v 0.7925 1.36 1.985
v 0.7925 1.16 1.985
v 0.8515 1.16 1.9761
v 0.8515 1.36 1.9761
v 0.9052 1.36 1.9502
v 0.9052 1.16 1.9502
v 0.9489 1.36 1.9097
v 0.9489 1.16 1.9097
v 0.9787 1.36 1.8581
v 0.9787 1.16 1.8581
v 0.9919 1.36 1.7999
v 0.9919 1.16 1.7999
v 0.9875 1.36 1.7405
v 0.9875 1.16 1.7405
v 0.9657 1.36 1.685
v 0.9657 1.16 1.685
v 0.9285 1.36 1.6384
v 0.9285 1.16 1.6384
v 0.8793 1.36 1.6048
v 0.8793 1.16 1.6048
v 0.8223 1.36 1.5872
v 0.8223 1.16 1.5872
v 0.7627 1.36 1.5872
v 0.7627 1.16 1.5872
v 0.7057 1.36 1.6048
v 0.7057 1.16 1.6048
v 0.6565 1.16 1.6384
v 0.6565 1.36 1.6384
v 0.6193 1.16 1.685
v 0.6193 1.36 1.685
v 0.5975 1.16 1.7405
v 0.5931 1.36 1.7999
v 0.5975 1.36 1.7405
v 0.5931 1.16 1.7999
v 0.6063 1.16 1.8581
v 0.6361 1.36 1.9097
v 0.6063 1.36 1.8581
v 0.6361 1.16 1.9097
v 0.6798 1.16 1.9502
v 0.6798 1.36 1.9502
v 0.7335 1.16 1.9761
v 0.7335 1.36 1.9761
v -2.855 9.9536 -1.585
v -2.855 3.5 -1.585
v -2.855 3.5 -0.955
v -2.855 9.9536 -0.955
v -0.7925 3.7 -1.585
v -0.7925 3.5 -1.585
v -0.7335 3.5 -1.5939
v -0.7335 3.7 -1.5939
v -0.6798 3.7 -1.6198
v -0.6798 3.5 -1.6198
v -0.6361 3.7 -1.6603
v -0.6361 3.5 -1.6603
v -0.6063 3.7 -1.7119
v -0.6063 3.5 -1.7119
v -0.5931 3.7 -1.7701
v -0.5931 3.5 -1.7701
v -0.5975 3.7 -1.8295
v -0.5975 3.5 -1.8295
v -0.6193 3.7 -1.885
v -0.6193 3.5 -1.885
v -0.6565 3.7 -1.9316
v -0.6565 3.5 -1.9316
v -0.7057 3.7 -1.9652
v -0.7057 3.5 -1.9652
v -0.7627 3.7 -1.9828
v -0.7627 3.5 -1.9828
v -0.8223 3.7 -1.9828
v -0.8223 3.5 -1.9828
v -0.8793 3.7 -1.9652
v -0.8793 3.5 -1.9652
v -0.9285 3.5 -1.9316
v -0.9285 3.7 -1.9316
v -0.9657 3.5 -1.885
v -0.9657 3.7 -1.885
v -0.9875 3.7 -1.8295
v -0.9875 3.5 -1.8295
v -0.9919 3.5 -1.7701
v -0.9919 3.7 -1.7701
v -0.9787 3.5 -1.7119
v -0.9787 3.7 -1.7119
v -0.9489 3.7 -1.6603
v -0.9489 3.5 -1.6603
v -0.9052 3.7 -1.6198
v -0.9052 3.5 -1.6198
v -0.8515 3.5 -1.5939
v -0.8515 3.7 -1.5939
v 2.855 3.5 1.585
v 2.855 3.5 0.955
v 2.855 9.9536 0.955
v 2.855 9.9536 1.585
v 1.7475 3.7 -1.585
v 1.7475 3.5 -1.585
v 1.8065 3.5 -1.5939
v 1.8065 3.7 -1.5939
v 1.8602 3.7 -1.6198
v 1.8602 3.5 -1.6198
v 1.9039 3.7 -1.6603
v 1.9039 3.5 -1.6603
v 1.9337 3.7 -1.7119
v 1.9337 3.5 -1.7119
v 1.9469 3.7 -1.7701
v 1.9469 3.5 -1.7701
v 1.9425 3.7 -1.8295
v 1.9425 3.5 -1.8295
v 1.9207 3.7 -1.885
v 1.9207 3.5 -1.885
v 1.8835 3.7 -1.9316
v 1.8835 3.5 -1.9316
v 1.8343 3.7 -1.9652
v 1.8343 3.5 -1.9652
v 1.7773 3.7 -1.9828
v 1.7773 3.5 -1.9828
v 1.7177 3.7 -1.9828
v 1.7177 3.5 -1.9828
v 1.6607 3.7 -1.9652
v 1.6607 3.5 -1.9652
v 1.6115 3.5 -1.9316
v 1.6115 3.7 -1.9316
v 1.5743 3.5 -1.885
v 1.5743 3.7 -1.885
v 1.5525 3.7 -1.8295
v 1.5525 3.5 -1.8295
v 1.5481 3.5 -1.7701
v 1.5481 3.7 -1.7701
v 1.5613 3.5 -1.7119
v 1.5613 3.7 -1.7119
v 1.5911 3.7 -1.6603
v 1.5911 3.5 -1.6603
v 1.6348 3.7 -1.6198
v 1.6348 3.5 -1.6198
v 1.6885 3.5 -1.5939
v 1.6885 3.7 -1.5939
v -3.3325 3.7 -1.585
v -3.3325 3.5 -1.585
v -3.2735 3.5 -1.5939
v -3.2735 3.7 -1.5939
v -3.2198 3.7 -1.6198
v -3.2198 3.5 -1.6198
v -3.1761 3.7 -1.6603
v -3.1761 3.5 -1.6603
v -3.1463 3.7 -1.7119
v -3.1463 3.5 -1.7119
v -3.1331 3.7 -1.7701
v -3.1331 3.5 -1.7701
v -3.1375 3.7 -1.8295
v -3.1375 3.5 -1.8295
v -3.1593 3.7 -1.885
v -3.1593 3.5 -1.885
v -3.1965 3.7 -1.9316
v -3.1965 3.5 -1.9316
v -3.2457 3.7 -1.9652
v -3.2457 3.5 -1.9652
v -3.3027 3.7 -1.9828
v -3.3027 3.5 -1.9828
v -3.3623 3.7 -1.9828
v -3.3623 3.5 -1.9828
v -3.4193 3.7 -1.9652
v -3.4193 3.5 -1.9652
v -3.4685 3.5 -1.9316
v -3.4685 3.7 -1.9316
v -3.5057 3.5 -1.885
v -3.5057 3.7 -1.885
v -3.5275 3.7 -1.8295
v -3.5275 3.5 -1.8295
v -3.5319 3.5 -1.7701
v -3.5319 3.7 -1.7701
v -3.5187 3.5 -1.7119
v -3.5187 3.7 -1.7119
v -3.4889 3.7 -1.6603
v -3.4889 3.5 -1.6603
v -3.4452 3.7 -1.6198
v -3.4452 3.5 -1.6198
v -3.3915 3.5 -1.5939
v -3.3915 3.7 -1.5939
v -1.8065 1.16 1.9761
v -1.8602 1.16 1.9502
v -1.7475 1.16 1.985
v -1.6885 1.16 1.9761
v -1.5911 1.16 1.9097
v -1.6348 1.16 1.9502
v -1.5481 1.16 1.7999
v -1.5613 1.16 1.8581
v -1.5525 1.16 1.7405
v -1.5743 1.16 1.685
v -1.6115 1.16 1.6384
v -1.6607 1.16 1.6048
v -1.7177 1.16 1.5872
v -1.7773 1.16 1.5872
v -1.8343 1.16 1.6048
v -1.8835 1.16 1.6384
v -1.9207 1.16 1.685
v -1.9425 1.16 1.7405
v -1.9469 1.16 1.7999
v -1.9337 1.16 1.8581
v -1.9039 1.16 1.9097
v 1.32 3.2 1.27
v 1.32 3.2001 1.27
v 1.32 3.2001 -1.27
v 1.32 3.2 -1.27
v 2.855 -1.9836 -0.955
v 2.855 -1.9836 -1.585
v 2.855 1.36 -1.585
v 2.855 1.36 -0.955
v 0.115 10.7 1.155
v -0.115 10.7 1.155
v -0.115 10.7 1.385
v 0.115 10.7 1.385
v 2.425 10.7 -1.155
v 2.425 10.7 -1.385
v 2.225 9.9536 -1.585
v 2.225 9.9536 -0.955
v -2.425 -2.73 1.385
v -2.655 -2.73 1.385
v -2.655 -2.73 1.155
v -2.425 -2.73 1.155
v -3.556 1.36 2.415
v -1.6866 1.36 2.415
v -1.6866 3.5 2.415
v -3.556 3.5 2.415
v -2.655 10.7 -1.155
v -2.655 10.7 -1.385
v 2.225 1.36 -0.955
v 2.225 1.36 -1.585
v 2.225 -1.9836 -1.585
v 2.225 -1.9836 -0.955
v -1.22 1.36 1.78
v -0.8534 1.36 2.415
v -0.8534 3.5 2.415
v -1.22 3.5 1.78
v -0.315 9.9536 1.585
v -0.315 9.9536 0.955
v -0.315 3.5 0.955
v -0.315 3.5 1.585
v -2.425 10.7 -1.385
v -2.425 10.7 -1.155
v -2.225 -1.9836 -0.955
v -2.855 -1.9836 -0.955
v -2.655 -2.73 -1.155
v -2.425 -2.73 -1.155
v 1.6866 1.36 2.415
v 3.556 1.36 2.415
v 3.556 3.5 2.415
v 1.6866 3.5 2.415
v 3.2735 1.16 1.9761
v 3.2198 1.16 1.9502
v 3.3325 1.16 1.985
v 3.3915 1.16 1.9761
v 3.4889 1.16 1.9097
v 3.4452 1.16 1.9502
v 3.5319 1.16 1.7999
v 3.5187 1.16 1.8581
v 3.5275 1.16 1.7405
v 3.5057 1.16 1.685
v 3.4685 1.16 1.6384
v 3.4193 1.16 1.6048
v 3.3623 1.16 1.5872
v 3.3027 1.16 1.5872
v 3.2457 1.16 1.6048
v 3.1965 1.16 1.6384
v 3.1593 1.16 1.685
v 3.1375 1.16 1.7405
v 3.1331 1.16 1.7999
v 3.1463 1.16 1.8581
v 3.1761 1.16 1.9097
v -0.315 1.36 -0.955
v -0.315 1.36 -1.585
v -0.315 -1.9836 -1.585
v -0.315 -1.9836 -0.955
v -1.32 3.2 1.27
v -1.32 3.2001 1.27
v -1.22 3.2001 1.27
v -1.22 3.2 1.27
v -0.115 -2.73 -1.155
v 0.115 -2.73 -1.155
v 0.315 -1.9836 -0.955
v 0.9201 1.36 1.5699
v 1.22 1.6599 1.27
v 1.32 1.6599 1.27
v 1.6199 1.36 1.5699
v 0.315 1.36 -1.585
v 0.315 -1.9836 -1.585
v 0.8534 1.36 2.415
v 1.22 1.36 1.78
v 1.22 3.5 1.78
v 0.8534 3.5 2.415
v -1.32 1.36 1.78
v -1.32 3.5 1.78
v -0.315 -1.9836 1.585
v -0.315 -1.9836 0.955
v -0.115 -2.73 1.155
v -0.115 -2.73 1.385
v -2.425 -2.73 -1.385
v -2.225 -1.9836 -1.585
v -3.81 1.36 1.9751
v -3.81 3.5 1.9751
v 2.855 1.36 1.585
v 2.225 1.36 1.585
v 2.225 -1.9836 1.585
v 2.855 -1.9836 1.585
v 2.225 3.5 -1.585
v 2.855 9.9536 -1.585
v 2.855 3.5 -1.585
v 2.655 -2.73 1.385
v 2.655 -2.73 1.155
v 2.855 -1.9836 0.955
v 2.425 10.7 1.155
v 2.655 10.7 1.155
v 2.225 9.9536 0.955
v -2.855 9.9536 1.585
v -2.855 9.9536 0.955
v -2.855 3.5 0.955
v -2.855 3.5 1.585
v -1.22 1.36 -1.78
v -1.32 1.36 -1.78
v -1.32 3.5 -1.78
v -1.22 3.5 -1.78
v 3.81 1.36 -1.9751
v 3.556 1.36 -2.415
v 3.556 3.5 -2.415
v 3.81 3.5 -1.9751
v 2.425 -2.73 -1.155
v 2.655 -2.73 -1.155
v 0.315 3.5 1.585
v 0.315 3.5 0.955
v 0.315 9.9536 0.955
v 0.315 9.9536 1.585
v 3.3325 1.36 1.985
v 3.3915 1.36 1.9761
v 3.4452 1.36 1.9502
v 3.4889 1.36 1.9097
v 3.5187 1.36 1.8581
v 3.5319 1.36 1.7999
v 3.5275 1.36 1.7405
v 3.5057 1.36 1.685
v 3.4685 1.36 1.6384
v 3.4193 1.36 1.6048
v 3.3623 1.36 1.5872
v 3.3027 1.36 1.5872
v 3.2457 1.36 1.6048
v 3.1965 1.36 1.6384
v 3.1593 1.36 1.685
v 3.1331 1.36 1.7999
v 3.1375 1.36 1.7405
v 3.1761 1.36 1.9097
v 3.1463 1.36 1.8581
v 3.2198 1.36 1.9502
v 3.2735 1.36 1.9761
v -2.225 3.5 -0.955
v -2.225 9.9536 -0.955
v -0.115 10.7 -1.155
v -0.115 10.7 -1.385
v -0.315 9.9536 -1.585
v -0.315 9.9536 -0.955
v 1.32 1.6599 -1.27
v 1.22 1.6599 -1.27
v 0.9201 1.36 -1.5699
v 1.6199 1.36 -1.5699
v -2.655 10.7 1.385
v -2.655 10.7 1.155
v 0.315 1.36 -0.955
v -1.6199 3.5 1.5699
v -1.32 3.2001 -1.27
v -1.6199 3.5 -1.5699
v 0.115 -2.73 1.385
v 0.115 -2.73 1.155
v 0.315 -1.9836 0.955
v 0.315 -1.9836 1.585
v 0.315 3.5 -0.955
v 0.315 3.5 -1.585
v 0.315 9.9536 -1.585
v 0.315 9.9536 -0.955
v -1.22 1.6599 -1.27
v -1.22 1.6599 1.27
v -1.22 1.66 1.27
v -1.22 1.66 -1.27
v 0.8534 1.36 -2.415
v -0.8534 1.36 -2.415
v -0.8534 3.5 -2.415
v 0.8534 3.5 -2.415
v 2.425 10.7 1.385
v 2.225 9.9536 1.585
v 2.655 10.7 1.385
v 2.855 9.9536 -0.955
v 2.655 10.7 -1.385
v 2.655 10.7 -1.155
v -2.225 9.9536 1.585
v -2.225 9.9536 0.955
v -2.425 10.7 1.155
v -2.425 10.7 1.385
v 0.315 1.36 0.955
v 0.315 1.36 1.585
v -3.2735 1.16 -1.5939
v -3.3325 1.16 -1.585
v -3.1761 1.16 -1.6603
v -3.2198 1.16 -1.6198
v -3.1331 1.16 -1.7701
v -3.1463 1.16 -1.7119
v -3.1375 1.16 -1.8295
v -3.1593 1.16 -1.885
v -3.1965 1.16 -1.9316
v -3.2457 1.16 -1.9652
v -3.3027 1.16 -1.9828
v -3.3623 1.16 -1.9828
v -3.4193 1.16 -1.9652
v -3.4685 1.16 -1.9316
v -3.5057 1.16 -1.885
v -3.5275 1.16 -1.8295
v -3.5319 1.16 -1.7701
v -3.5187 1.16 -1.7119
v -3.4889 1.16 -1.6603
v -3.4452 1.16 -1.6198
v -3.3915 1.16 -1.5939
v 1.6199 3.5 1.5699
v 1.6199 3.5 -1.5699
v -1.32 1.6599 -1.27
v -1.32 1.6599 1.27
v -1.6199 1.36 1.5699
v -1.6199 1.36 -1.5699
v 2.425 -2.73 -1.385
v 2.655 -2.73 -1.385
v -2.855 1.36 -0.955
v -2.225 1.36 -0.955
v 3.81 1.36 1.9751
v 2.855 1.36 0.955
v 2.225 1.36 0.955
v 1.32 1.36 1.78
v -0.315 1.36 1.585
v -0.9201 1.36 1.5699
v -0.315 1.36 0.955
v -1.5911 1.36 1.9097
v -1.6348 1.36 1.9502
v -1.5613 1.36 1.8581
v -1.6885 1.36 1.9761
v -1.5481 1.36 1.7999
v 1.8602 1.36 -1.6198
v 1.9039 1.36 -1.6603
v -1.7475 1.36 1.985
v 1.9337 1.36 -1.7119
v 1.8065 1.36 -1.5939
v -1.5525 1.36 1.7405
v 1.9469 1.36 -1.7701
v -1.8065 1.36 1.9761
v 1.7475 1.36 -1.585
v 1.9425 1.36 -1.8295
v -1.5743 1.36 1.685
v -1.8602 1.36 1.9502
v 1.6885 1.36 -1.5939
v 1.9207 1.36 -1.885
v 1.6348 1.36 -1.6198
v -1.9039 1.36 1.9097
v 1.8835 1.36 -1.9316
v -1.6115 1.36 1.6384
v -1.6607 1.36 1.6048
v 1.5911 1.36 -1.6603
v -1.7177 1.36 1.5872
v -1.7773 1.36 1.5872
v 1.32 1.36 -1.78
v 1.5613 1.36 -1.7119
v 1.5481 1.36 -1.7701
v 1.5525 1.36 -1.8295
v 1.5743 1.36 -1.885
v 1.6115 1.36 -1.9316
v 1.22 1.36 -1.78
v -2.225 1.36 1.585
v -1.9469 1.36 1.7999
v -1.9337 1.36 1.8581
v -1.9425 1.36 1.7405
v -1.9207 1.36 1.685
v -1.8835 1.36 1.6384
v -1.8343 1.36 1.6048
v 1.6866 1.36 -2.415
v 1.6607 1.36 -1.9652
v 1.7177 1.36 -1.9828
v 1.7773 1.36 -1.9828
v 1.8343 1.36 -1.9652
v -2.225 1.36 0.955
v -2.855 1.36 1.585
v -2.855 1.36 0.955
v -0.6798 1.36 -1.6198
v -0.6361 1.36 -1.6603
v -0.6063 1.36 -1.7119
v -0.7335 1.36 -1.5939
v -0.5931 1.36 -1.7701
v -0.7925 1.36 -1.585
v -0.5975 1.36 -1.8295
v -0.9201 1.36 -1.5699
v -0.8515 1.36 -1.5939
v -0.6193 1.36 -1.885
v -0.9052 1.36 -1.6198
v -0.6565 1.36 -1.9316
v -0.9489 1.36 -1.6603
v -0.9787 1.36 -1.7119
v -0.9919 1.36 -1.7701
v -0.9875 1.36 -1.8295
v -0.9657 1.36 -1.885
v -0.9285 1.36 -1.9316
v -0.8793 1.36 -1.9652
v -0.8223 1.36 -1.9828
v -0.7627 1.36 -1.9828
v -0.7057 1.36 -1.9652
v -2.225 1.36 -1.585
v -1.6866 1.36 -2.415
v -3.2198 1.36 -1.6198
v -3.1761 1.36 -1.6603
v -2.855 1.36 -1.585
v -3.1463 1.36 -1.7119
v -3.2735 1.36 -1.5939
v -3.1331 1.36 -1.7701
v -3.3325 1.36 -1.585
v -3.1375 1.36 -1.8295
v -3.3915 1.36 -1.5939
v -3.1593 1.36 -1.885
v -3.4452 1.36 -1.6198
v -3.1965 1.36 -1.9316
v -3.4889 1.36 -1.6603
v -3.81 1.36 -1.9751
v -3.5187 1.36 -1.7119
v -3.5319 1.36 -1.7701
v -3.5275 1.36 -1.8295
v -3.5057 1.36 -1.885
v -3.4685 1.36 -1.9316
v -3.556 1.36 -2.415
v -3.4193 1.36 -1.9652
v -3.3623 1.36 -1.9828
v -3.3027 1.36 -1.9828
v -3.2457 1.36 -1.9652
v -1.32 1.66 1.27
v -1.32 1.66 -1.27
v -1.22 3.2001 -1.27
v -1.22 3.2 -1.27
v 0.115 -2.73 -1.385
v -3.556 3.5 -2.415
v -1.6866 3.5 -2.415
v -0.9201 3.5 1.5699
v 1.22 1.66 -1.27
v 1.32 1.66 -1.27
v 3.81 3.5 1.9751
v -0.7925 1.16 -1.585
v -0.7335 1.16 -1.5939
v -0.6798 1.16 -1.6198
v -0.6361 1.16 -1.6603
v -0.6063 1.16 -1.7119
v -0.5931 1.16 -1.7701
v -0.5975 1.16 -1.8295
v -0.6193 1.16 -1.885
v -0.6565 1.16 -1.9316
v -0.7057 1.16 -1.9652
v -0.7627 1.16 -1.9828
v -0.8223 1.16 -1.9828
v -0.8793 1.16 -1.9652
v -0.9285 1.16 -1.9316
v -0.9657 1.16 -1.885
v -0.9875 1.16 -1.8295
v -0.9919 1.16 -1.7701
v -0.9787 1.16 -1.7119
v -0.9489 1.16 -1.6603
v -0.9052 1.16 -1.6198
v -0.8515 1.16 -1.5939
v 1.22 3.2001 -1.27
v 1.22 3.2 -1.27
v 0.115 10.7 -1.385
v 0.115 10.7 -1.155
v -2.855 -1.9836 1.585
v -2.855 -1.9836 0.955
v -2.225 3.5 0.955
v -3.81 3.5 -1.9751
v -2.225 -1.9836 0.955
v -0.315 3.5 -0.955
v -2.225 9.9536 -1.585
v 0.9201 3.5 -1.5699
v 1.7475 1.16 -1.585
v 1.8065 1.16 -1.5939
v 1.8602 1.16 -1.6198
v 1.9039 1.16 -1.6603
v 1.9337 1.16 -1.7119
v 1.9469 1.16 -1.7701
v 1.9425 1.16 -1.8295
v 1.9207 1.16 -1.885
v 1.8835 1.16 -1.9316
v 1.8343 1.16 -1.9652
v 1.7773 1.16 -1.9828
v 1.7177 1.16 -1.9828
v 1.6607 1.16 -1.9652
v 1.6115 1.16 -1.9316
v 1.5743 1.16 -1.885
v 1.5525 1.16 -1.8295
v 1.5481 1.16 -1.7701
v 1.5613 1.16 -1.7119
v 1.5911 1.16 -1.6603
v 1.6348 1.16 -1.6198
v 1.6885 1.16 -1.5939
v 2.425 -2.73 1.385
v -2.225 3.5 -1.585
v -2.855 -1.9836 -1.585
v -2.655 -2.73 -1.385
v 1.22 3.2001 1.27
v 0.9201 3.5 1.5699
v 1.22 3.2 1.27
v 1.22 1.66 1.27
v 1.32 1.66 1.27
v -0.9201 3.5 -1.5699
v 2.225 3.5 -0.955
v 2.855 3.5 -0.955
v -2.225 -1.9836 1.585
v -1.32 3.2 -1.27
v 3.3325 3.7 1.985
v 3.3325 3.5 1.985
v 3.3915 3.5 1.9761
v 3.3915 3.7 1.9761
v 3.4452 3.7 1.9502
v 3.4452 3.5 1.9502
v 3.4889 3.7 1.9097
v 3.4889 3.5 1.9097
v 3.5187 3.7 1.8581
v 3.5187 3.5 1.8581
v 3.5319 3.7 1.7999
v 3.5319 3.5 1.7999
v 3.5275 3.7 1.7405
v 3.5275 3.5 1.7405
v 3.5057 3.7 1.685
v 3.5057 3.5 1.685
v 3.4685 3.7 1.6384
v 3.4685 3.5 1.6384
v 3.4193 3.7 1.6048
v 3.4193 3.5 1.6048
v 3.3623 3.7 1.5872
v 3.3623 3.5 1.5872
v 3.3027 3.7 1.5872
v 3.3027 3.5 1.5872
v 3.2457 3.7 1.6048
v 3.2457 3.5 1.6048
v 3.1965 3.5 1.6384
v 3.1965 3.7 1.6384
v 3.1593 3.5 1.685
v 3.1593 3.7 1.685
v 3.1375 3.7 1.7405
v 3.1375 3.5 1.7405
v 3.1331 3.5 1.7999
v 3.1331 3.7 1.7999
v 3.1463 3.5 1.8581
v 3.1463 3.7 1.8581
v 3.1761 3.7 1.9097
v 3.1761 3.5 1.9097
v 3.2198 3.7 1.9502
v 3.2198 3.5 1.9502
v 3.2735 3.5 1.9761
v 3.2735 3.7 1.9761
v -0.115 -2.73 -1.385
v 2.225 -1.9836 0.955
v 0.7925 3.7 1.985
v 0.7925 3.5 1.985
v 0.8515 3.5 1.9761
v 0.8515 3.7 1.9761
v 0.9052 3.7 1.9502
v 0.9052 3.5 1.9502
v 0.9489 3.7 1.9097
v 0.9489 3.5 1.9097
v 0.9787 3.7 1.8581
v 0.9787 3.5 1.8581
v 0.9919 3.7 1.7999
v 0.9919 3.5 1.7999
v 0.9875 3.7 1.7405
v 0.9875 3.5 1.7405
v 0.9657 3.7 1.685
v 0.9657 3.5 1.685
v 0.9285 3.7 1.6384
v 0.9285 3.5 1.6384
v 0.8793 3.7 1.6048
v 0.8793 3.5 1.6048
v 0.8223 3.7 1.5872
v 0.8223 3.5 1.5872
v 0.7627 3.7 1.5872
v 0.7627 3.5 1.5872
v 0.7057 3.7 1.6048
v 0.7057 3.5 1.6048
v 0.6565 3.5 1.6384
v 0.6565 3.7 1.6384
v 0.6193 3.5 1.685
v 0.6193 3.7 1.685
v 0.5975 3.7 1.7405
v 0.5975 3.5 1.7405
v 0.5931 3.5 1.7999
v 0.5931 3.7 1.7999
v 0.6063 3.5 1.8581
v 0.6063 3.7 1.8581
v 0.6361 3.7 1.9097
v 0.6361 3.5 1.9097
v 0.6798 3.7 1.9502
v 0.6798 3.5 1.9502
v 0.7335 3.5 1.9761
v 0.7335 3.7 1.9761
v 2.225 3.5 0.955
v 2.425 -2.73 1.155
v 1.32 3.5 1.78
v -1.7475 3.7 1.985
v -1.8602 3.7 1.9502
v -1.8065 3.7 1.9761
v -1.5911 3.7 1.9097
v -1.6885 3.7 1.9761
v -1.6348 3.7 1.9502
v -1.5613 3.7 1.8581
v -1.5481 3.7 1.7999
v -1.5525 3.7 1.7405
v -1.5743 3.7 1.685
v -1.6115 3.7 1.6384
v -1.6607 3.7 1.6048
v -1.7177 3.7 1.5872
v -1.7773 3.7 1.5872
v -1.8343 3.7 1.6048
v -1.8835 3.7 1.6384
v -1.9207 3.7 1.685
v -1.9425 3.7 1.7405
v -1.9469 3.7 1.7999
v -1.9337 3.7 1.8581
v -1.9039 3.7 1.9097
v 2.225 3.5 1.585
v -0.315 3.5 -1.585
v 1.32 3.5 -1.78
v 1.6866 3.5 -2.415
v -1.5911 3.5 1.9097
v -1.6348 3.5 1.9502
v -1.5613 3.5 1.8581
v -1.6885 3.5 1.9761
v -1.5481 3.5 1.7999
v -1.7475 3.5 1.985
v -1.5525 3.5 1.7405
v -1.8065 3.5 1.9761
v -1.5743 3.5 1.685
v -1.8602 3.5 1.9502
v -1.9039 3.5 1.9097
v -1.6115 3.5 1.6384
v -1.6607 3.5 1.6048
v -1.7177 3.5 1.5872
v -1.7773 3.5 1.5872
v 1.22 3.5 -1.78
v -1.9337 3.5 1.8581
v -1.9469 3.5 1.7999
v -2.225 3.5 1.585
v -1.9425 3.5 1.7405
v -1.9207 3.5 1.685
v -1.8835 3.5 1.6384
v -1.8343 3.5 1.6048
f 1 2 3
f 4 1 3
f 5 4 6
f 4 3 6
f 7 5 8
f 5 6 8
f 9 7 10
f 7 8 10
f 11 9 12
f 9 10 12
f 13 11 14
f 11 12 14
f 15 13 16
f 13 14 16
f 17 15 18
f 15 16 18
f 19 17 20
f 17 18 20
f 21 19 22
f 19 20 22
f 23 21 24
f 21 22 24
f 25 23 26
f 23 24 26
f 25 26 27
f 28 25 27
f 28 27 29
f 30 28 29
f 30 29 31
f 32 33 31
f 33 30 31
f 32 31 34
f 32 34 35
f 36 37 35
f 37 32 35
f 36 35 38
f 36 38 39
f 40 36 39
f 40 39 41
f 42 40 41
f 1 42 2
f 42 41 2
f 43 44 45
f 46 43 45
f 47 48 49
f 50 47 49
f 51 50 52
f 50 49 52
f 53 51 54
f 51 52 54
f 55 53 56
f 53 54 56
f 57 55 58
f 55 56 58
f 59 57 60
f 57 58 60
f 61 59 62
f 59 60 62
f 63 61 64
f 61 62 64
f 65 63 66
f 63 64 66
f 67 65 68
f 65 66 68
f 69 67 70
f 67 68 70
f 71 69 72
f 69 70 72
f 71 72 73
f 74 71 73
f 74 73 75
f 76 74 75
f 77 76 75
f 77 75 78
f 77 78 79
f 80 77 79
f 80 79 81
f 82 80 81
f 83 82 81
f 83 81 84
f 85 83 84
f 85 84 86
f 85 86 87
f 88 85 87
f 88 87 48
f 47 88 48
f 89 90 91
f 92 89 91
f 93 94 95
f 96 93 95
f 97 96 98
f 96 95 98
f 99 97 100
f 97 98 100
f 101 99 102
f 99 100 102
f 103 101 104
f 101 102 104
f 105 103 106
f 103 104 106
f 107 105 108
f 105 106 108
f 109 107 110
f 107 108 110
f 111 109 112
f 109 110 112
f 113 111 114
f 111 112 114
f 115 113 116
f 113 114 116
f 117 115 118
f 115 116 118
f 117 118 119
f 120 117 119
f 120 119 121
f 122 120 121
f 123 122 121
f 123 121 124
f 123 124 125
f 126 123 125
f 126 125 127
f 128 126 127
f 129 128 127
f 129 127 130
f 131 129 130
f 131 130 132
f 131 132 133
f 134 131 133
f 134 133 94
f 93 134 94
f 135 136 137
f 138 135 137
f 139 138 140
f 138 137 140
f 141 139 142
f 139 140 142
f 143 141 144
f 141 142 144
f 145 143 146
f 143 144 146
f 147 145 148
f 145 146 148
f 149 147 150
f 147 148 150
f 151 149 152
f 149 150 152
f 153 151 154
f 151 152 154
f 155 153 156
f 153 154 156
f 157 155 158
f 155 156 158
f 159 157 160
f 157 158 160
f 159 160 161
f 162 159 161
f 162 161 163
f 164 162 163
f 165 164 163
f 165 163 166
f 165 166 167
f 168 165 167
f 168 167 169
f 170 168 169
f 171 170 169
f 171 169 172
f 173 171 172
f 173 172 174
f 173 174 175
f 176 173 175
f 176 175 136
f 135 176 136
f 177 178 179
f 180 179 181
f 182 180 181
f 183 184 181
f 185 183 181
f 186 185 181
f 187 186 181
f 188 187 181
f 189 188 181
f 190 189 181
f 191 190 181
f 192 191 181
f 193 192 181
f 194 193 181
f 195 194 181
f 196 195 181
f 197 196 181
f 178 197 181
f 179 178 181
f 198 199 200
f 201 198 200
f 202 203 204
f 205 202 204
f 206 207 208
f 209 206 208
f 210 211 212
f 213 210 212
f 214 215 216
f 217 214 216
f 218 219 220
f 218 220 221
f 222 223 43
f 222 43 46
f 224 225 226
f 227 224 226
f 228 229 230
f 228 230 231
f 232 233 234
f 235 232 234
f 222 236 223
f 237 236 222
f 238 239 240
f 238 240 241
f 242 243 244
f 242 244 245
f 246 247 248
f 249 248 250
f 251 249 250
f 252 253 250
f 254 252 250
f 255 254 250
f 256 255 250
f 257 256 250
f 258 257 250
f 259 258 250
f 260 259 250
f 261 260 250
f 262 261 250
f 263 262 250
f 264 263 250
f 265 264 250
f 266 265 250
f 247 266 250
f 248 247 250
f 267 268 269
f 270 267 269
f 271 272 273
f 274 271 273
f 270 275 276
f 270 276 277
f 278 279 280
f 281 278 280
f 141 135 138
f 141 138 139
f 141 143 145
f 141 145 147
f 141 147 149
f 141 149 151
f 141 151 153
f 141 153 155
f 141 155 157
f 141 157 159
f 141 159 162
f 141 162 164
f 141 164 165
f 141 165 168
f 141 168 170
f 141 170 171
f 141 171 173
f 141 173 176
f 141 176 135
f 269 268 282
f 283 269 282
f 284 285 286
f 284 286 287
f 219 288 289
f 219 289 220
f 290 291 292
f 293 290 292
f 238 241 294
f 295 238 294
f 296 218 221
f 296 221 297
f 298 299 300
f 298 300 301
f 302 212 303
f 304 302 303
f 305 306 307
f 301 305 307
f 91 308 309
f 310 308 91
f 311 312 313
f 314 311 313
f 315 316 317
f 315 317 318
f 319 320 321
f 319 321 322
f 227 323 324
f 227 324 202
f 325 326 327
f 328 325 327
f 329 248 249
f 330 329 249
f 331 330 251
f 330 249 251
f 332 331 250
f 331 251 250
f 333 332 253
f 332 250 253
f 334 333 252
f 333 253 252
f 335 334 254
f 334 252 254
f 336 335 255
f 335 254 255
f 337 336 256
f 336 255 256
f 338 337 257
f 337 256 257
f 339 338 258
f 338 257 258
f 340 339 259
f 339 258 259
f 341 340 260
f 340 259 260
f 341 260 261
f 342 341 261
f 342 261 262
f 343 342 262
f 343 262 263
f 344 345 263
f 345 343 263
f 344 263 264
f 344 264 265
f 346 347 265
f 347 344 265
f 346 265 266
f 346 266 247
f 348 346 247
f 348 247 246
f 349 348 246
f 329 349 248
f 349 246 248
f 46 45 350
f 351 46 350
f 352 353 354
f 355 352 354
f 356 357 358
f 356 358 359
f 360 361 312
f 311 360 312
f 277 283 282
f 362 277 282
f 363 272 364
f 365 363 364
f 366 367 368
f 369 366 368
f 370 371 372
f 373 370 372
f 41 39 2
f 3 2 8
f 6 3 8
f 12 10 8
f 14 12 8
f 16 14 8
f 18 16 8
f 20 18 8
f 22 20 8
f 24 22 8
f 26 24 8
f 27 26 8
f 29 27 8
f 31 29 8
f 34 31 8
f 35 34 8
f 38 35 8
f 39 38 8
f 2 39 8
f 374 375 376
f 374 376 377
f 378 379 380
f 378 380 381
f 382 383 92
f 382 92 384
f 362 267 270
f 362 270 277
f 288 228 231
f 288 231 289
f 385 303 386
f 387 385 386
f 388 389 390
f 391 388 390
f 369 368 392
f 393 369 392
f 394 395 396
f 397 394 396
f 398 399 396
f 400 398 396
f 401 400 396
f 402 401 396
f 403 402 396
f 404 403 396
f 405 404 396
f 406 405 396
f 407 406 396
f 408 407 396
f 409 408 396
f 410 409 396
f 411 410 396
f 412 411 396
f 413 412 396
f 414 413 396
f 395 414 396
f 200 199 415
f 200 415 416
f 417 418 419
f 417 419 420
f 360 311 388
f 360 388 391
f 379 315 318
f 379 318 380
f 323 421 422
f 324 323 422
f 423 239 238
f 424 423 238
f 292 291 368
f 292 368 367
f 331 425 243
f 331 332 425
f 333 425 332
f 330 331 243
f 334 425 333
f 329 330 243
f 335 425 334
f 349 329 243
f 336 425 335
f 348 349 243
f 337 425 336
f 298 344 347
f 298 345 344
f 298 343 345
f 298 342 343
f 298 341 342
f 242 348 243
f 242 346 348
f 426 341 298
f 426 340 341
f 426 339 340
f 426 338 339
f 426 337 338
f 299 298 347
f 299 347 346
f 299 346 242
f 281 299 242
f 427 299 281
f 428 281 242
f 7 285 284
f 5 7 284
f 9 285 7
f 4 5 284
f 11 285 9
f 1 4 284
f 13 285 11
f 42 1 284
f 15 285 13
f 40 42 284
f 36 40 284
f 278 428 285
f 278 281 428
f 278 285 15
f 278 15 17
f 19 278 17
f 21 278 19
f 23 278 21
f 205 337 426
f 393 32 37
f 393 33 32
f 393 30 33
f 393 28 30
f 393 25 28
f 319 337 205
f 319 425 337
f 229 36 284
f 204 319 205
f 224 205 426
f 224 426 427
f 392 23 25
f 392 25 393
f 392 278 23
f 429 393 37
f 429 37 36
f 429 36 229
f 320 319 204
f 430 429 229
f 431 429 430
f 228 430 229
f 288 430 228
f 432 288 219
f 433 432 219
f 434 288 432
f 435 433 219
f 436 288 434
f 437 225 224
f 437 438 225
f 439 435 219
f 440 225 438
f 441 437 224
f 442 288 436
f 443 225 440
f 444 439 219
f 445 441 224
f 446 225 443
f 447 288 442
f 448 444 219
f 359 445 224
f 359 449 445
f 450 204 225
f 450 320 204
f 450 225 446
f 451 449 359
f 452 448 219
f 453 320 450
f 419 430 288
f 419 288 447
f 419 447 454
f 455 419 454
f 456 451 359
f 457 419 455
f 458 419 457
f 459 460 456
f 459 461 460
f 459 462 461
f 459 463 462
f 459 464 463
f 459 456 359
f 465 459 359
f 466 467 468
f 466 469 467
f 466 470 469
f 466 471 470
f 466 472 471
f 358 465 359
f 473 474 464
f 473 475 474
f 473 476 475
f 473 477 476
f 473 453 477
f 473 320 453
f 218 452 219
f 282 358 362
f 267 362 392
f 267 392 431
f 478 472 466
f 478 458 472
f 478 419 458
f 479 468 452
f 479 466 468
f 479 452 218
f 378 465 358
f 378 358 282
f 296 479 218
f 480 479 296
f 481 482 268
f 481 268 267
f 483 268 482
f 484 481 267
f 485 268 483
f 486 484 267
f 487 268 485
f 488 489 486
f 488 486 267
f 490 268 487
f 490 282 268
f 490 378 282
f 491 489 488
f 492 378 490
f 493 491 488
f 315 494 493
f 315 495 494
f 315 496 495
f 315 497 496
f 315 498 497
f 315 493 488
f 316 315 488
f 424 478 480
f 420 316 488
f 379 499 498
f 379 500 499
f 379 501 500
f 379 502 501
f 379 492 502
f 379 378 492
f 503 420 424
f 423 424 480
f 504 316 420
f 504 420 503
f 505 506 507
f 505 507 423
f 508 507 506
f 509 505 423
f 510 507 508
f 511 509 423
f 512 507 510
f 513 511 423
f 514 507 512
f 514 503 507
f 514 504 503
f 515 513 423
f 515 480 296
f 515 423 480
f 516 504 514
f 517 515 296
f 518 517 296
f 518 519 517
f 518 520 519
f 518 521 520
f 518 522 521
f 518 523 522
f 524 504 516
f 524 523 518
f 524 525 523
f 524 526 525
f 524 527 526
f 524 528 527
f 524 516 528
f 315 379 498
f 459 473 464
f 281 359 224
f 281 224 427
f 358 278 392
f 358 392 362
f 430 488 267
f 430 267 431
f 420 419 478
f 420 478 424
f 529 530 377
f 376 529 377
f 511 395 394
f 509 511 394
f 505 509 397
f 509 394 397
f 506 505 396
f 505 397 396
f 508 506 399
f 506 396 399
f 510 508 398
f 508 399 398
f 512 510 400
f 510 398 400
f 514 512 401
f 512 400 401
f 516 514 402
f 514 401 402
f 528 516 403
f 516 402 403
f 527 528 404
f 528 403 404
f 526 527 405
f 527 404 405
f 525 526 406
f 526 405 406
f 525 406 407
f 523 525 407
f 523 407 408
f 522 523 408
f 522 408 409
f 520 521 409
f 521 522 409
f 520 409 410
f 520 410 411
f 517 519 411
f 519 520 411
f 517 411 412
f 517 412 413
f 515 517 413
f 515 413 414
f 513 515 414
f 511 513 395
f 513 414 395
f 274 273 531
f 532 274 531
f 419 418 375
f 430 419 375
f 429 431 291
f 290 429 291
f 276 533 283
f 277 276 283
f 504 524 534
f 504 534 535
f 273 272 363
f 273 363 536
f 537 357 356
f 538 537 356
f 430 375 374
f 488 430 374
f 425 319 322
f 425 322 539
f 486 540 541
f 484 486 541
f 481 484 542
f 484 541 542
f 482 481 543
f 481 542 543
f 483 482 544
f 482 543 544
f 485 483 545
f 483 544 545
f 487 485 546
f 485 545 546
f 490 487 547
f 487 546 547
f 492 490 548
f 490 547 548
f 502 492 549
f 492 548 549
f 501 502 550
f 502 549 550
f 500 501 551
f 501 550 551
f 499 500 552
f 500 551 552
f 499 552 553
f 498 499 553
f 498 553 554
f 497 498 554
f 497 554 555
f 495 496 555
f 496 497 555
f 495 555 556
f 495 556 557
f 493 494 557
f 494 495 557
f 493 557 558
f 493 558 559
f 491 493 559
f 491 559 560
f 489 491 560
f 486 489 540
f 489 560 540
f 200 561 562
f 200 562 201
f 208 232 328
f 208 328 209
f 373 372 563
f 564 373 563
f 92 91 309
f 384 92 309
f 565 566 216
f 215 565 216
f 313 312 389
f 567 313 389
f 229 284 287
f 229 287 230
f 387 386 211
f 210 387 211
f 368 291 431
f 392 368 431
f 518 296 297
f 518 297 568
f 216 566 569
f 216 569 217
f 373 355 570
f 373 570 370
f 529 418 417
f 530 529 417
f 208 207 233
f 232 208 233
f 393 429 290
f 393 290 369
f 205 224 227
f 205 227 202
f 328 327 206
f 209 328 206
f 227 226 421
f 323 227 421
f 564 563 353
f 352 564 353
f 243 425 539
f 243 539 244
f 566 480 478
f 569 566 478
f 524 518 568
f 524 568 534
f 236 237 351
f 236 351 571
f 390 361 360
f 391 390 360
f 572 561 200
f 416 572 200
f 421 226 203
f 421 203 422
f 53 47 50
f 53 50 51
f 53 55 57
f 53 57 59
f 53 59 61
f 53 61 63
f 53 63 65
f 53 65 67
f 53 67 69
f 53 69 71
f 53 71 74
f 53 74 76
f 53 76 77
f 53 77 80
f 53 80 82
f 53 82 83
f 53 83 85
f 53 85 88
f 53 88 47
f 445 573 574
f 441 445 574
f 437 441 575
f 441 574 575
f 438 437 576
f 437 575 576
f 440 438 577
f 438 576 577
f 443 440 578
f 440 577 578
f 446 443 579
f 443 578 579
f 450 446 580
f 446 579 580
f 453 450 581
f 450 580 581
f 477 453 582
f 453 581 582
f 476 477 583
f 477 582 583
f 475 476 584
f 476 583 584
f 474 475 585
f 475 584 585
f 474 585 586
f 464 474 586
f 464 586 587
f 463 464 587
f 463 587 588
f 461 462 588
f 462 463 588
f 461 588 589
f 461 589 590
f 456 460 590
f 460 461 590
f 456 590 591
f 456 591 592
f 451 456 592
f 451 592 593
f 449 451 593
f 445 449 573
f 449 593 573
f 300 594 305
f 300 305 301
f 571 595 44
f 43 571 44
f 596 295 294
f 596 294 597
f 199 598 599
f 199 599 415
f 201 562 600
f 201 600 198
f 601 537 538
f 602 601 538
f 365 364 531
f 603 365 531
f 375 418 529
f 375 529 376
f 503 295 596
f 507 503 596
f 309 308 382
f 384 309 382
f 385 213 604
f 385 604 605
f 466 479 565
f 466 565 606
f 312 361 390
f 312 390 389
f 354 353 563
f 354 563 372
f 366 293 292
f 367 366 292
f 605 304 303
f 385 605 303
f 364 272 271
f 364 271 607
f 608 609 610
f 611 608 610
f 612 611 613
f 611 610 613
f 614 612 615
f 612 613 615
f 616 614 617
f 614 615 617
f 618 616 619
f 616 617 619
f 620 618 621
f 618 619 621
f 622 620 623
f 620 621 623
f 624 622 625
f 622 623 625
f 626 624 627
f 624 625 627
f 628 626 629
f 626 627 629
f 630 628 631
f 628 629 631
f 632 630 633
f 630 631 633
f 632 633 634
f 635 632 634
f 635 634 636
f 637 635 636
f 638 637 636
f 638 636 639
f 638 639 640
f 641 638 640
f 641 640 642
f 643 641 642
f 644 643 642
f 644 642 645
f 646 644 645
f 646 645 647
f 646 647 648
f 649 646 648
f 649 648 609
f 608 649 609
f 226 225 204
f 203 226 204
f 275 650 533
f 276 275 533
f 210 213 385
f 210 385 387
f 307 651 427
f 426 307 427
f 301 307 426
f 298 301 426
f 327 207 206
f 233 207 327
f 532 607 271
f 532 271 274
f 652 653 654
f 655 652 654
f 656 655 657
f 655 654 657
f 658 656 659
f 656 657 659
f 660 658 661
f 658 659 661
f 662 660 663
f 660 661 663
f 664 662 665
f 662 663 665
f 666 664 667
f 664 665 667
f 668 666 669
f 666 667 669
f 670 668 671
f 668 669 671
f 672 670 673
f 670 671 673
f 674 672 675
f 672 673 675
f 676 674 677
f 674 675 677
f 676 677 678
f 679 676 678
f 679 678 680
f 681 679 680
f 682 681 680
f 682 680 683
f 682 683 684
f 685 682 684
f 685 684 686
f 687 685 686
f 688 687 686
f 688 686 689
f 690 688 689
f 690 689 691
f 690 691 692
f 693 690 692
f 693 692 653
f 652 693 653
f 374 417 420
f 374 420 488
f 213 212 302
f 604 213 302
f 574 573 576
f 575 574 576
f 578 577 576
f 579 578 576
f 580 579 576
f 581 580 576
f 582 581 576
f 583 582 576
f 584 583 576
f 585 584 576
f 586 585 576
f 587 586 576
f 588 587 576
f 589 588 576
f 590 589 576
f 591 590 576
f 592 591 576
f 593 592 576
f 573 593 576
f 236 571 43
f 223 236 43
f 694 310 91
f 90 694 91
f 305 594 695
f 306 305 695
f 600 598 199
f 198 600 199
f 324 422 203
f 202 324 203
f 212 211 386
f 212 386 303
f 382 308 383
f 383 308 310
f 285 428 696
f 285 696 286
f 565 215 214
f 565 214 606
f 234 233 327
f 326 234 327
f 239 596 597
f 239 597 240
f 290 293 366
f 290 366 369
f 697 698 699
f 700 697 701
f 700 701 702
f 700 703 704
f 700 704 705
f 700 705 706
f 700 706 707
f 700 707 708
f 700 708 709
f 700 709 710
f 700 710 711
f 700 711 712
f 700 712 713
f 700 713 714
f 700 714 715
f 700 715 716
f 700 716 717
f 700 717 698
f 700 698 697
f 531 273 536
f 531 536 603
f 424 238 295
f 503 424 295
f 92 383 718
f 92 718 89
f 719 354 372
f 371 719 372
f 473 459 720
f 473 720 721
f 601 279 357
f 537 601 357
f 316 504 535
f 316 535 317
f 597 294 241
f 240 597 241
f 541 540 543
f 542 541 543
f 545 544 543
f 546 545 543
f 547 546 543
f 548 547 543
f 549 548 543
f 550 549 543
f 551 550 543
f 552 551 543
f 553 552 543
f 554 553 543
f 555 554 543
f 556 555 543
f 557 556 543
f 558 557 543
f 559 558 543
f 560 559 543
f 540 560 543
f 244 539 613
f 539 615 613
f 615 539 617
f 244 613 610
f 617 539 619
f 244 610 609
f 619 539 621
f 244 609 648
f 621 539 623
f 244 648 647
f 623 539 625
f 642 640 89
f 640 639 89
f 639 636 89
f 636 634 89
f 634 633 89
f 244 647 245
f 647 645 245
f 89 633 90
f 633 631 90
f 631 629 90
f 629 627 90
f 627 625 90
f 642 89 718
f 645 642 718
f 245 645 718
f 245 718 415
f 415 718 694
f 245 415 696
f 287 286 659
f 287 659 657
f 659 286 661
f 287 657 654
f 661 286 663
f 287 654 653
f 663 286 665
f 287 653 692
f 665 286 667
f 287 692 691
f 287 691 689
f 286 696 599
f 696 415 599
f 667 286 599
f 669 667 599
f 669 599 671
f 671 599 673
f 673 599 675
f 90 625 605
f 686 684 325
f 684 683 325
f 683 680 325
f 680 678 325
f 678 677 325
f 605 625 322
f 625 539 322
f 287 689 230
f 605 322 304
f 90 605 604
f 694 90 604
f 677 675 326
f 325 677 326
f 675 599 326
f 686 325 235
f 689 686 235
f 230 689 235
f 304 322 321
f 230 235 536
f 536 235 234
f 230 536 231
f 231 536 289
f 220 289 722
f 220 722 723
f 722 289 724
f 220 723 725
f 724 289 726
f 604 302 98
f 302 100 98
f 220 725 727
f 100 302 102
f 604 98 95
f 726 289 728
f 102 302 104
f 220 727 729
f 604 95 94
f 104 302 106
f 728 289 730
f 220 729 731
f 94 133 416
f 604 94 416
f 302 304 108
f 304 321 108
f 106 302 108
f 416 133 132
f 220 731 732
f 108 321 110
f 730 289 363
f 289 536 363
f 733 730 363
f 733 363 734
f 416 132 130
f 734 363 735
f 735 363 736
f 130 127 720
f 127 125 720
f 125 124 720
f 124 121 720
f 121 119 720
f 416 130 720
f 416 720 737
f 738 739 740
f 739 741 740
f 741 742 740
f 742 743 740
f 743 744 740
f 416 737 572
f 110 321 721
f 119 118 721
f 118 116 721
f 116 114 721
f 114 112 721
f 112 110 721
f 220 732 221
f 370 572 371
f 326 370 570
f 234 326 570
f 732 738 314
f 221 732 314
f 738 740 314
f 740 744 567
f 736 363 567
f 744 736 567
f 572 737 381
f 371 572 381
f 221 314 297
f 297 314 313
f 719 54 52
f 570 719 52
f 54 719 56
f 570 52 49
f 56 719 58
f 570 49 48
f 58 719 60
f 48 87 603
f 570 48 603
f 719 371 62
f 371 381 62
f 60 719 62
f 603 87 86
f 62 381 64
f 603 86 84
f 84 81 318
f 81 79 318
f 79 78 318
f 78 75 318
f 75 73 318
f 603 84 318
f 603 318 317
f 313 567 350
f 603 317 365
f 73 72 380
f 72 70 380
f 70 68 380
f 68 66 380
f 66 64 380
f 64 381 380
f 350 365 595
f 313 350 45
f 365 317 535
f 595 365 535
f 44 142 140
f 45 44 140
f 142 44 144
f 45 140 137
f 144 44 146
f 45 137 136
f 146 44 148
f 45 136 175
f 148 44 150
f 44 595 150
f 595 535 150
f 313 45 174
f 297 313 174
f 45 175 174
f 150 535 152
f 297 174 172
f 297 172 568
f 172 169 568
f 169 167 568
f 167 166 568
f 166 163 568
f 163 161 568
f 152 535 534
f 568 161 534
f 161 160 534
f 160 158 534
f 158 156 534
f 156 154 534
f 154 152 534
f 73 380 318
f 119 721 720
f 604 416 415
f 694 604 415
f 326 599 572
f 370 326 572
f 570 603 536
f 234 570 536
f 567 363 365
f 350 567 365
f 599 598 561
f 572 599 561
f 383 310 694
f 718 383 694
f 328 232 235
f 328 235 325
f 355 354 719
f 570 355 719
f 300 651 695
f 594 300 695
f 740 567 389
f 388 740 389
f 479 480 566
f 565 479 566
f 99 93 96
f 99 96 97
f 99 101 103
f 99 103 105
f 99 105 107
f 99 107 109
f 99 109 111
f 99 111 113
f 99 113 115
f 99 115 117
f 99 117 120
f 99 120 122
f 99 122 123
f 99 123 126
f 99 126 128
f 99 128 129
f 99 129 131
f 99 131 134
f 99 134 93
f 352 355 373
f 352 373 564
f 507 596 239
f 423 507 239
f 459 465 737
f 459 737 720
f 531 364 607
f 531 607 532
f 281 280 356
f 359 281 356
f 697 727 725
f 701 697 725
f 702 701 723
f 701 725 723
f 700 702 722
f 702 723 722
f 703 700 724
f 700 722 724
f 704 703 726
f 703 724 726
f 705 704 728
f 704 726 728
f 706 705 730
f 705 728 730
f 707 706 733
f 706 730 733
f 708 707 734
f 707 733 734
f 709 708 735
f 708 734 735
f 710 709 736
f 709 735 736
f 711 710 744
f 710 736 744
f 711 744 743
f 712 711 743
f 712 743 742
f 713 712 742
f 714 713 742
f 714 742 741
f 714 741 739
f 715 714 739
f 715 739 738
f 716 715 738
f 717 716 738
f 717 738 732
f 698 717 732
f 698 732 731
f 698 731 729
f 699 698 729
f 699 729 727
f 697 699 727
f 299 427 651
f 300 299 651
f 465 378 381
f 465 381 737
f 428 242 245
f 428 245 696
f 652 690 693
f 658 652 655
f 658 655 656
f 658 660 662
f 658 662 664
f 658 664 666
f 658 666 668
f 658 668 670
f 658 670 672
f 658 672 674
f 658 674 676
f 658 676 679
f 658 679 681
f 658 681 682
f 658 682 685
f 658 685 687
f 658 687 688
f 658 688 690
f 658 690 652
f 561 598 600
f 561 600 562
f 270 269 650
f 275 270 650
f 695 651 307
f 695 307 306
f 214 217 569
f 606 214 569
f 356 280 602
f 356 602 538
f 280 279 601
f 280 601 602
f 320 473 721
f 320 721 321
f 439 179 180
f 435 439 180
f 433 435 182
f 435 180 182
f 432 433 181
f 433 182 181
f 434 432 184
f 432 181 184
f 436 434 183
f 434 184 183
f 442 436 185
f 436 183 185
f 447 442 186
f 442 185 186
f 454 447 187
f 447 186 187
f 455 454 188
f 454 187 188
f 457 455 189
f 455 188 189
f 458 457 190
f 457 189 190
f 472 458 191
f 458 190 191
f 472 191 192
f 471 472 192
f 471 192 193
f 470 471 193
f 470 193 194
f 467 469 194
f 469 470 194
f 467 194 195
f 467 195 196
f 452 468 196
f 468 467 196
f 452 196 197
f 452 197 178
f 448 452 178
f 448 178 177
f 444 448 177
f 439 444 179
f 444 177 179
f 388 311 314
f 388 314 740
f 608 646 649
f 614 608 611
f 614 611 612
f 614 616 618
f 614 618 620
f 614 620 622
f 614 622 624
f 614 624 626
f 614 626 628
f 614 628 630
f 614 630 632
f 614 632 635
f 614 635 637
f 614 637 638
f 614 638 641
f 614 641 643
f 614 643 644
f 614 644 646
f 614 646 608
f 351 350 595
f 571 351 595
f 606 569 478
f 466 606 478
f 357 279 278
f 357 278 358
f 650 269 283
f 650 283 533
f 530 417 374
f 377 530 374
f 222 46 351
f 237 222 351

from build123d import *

# Parameters (mm, degrees)
BOSS_EXTRUDE1_DEPTH      = 2.14
BOSS_EXTRUDE2_START      = -2.34
SKETCH2_R                = 0.2
BOSS_EXTRUDE2_DEPTH      = 2.54
LPATTERN1_COUNT          = 3
LPATTERN1_PITCH          = 2.54
SKETCH3_W                = 0.1
SKETCH3_H                = 2.54
CUT_EXTRUDE1_DEPTH       = 0.3
CHAMFER1_SIZE            = 0.3
CHAMFER1_OF_MIRROR2_SIZE = 0.3
SKETCH6_W                = 0.63
SKETCH6_H                = 0.63
CHAMFER2_SIZE            = 0.2
CHAMFER2_SIZE2           = 0.746410162
CHAMFER3_SIZE            = 0.2
CHAMFER3_SIZE2           = 0.746410162
LPATTERN2_START          = -1.585
LPATTERN2_DEPTH          = 0.63
LPATTERN2_START_2        = -1
LPATTERN2_2_DEPTH        = 5
MIRROR4_START            = -2.655
MIRROR4_DEPTH            = 0.23
MIRROR4_START_2          = -0.115
MIRROR4_2_DEPTH          = 0.23
MIRROR4_START_3          = 2.425
MIRROR4_3_DEPTH          = 0.23
MIRROR4_START_4          = 0.955
MIRROR4_4_DEPTH          = 0.63
MIRROR4_START_5          = -4
MIRROR4_5_DEPTH          = 8


with BuildPart() as part:
    # Sketch1 → Boss-Extrude1 (new body)
    with BuildSketch(Plane(origin=(0, 1.36, 0), x_dir=(1, 0, 0), z_dir=(0, 1, 0))):
        Polygon((-1.686617421, 2.415), (-1.32, 1.78), (-1.22, 1.78), (-0.853382579, 2.415), (0.853382579, 2.415), (1.22, 1.78), (1.32, 1.78), (1.686617421, 2.415), (3.556, 2.415), (3.81, 1.975059095), (3.81, -1.975059095), (3.556, -2.415), (1.686617421, -2.415), (1.32, -1.78), (1.22, -1.78), (0.853382579, -2.415), (-0.853382579, -2.415), (-1.22, -1.78), (-1.32, -1.78), (-1.686617421, -2.415), (-3.556, -2.415), (-3.81, -1.975059095), (-3.81, 1.975059095), (-3.556, 2.415), align=None)
    extrude(amount=BOSS_EXTRUDE1_DEPTH)

    # Sketch2 → Boss-Extrude2 (add)
    with BuildSketch(Plane(origin=(0, 3.5, 0), x_dir=(1, 0, 0), z_dir=(0, 1, 0)).offset(BOSS_EXTRUDE2_START)):
        with Locations(Location((-3.3325, 1.785, 0), (0, 0, 270))):
            Circle(SKETCH2_R)
        with Locations(Location((-1.7475, -1.785, 0), (0, 0, 270))):
            Circle(SKETCH2_R)
    boss_extrude2 = extrude(amount=BOSS_EXTRUDE2_DEPTH)

    # LPattern1: Boss-Extrude2 ×3
    with Locations(*[(i * LPATTERN1_PITCH, 0, 0) for i in range(1, LPATTERN1_COUNT)]):
        add(boss_extrude2)

    # Sketch3 → Cut-Extrude1 (cut)
    with BuildSketch(Plane(origin=(0, 3.5, 0), x_dir=(1, 0, 0), z_dir=(0, 1, 0))):
        with Locations((-1.27, 0)):
            Rectangle(SKETCH3_W, SKETCH3_H)
        with Locations((1.27, 0)):
            Rectangle(SKETCH3_W, SKETCH3_H)
    cut_extrude1 = extrude(amount=-CUT_EXTRUDE1_DEPTH, mode=Mode.SUBTRACT)

    # Chamfer1
    chamfer1_edges = [part.edges().sort_by_distance(p)[0] for p in [
        (-1.27, 3.5, 1.27),
        (-1.22, 3.5, 0),
        (-1.27, 3.5, -1.27),
        (-1.32, 3.5, 0),
        (1.27, 3.5, 1.27),
        (1.32, 3.5, 0),
        (1.22, 3.5, 0),
        (1.27, 3.5, -1.27),
    ]]
    chamfer(chamfer1_edges, length=CHAMFER1_SIZE - 0.0001)  # a hair under: the kernel refuses the full size

    # Mirror2: Cut-Extrude1 across plane
    add(cut_extrude1.mirror(Plane.ZX.offset(2.43)), mode=Mode.SUBTRACT)

    # Chamfer1 of Mirror2
    chamfer1_of_mirror2_edges = [part.edges().sort_by_distance(p)[0] for p in [
        (-1.27, 1.36, 1.27),
        (-1.22, 1.36, 0),
        (-1.27, 1.36, -1.27),
        (-1.32, 1.36, 0),
        (1.27, 1.36, 1.27),
        (1.32, 1.36, 0),
        (1.22, 1.36, 0),
        (1.27, 1.36, -1.27),
    ]]
    chamfer(chamfer1_of_mirror2_edges, length=CHAMFER1_OF_MIRROR2_SIZE - 0.0001)  # a hair under: the kernel refuses the full size

    # Sweep1: sweep along a path in Sketch5
    with BuildLine(Plane(origin=(-2.54, 0, 0), x_dir=(0, 0, -1), z_dir=(1, 0, 0))) as sweep1_path:
        Line((1.27, 10.7), (1.27, -2.73))
    # Sketch6 → Sweep1 (sweep)
    with BuildSketch(Plane(origin=(0, 10.7, 0), x_dir=(1, 0, 0), z_dir=(0, 1, 0))):
        with Locations((-2.54, 1.27)):
            Rectangle(SKETCH6_W, SKETCH6_H)
    sweep(path=sweep1_path.line)

    # Chamfer2
    chamfer2_edges = [part.edges().sort_by_distance(p)[0] for p in [
        (-2.225, -2.73, -1.27),
        (-2.54, -2.73, -0.955),
        (-2.855, -2.73, -1.27),
        (-2.54, -2.73, -1.585),
    ]]
    chamfer2_side = [part.faces().sort_by_distance(p)[0] for p in [
        (-2.54, -2.73, -1.27),
    ]]
    chamfer(chamfer2_edges, length=CHAMFER2_SIZE, length2=CHAMFER2_SIZE2, reference=chamfer2_side[0])

    # Chamfer3
    chamfer3_edges = [part.edges().sort_by_distance(p)[0] for p in [
        (-2.225, 10.7, -1.27),
        (-2.54, 10.7, -1.585),
        (-2.855, 10.7, -1.27),
        (-2.54, 10.7, -0.955),
    ]]
    chamfer3_side = [part.faces().sort_by_distance(p)[0] for p in [
        (-2.54, 10.7, -1.27),
    ]]
    chamfer(chamfer3_edges, length=CHAMFER3_SIZE, length2=CHAMFER3_SIZE2, reference=chamfer3_side[0])

    # LPattern2: read off the stored shape, not the designer's step
    # LPattern2 outline → LPattern2 (add)
    with BuildSketch(Plane.XY.offset(LPATTERN2_START)):
        Polygon((2.225, 9.953589838), (2.225, 3.5), (2.855, 3.5), (2.855, 9.953589838), (2.655, 10.7), (2.425, 10.7), align=None)
        Polygon((0.115, 10.7), (-0.115, 10.7), (-0.315, 9.953589838), (-0.315, 3.5), (0.315, 3.5), (0.315, 9.953589838), align=None)
        Polygon((-0.315, -1.983589838), (-0.115, -2.73), (0.115, -2.73), (0.315, -1.983589838), (0.315, 1.36), (-0.315, 1.36), align=None)
        Polygon((2.855, 1.36), (2.225, 1.36), (2.225, -1.983589838), (2.425, -2.73), (2.655, -2.73), (2.855, -1.983589838), align=None)
    extrude(amount=LPATTERN2_DEPTH)

    # LPattern2 2 outline → LPattern2 2 (cut)
    with BuildSketch(Plane.YZ.offset(LPATTERN2_START_2)):
        Polygon((-2.73, -0.955), (-2.73, -1.155), (-1.983589838, -0.955), align=None)
        Polygon((-1.983589838, -1.585), (-2.73, -1.385), (-2.73, -1.585), align=None)
        Polygon((9.953589838, -0.955), (10.7, -1.155), (10.7, -0.955), align=None)
        Polygon((10.7, -1.385), (9.953589838, -1.585), (10.7, -1.585), align=None)
    extrude(amount=LPATTERN2_2_DEPTH, mode=Mode.SUBTRACT)

    # Mirror4: read off the stored shape, not the designer's step
    # Mirror4 outline → Mirror4 (add)
    with BuildSketch(Plane.YZ.offset(MIRROR4_START)):
        Polygon((10.7, 1.155), (10.7, 1.385), (9.953589838, 1.585), (3.5, 1.585), (3.5, 0.955), (9.953589838, 0.955), align=None)
        Polygon((-1.983589838, 1.585), (-2.73, 1.385), (-2.73, 1.155), (-1.983589838, 0.955), (1.36, 0.955), (1.36, 1.585), align=None)
    extrude(amount=MIRROR4_DEPTH)

    # Mirror4 2 outline → Mirror4 2 (add)
    with BuildSketch(Plane.YZ.offset(MIRROR4_START_2)):
        Polygon((10.7, 1.155), (10.7, 1.385), (9.953589838, 1.585), (3.5, 1.585), (3.5, 0.955), (9.953589838, 0.955), align=None)
        Polygon((-1.983589838, 1.585), (-2.73, 1.385), (-2.73, 1.155), (-1.983589838, 0.955), (1.36, 0.955), (1.36, 1.585), align=None)
    extrude(amount=MIRROR4_2_DEPTH)

    # Mirror4 3 outline → Mirror4 3 (add)
    with BuildSketch(Plane.YZ.offset(MIRROR4_START_3)):
        Polygon((10.7, 1.155), (10.7, 1.385), (9.953589838, 1.585), (3.5, 1.585), (3.5, 0.955), (9.953589838, 0.955), align=None)
        Polygon((-1.983589838, 1.585), (-2.73, 1.385), (-2.73, 1.155), (-1.983589838, 0.955), (1.36, 0.955), (1.36, 1.585), align=None)
    extrude(amount=MIRROR4_3_DEPTH)

    # Mirror4 4 outline → Mirror4 4 (add)
    with BuildSketch(Plane.XY.offset(MIRROR4_START_4)):
        Polygon((-2.655, 1.36), (-2.855, 1.36), (-2.855, -1.983589838), (-2.655, -2.73), align=None)
        Polygon((2.855, 1.36), (2.655, 1.36), (2.655, -2.73), (2.855, -1.983589838), align=None)
        Polygon((2.425, 1.36), (2.225, 1.36), (2.225, -1.983589838), (2.425, -2.73), align=None)
        Polygon((0.315, 1.36), (0.115, 1.36), (0.115, -2.73), (0.315, -1.983589838), align=None)
        Polygon((-0.115, 1.36), (-0.315, 1.36), (-0.315, -1.983589838), (-0.115, -2.73), align=None)
        Polygon((-2.225, 1.36), (-2.425, 1.36), (-2.425, -2.73), (-2.225, -1.983589838), align=None)
        Polygon((-2.655, 10.7), (-2.855, 9.953589838), (-2.855, 3.5), (-2.655, 3.5), align=None)
        Polygon((2.655, 10.7), (2.655, 3.5), (2.855, 3.5), (2.855, 9.953589838), align=None)
        Polygon((2.225, 9.953589838), (2.225, 3.5), (2.425, 3.5), (2.425, 10.7), align=None)
        Polygon((0.115, 10.7), (0.115, 3.5), (0.315, 3.5), (0.315, 9.953589838), align=None)
        Polygon((-0.315, 9.953589838), (-0.315, 3.5), (-0.115, 3.5), (-0.115, 10.7), align=None)
        Polygon((-2.425, 10.7), (-2.425, 3.5), (-2.225, 3.5), (-2.225, 9.953589838), align=None)
    extrude(amount=MIRROR4_4_DEPTH)

    # Mirror4 5 outline → Mirror4 5 (cut)
    with BuildSketch(Plane.YZ.offset(MIRROR4_START_5)):
        Polygon((-2.73, 1.155), (-2.73, 0.955), (-1.983589838, 0.955), align=None)
        Polygon((-2.73, 1.585), (-2.73, 1.385), (-1.983589838, 1.585), align=None)
        Polygon((10.7, 1.585), (9.953589838, 1.585), (10.7, 1.385), align=None)
        Polygon((10.7, 1.155), (9.953589838, 0.955), (10.7, 0.955), align=None)
    extrude(amount=MIRROR4_5_DEPTH, mode=Mode.SUBTRACT)


solid = part.part
